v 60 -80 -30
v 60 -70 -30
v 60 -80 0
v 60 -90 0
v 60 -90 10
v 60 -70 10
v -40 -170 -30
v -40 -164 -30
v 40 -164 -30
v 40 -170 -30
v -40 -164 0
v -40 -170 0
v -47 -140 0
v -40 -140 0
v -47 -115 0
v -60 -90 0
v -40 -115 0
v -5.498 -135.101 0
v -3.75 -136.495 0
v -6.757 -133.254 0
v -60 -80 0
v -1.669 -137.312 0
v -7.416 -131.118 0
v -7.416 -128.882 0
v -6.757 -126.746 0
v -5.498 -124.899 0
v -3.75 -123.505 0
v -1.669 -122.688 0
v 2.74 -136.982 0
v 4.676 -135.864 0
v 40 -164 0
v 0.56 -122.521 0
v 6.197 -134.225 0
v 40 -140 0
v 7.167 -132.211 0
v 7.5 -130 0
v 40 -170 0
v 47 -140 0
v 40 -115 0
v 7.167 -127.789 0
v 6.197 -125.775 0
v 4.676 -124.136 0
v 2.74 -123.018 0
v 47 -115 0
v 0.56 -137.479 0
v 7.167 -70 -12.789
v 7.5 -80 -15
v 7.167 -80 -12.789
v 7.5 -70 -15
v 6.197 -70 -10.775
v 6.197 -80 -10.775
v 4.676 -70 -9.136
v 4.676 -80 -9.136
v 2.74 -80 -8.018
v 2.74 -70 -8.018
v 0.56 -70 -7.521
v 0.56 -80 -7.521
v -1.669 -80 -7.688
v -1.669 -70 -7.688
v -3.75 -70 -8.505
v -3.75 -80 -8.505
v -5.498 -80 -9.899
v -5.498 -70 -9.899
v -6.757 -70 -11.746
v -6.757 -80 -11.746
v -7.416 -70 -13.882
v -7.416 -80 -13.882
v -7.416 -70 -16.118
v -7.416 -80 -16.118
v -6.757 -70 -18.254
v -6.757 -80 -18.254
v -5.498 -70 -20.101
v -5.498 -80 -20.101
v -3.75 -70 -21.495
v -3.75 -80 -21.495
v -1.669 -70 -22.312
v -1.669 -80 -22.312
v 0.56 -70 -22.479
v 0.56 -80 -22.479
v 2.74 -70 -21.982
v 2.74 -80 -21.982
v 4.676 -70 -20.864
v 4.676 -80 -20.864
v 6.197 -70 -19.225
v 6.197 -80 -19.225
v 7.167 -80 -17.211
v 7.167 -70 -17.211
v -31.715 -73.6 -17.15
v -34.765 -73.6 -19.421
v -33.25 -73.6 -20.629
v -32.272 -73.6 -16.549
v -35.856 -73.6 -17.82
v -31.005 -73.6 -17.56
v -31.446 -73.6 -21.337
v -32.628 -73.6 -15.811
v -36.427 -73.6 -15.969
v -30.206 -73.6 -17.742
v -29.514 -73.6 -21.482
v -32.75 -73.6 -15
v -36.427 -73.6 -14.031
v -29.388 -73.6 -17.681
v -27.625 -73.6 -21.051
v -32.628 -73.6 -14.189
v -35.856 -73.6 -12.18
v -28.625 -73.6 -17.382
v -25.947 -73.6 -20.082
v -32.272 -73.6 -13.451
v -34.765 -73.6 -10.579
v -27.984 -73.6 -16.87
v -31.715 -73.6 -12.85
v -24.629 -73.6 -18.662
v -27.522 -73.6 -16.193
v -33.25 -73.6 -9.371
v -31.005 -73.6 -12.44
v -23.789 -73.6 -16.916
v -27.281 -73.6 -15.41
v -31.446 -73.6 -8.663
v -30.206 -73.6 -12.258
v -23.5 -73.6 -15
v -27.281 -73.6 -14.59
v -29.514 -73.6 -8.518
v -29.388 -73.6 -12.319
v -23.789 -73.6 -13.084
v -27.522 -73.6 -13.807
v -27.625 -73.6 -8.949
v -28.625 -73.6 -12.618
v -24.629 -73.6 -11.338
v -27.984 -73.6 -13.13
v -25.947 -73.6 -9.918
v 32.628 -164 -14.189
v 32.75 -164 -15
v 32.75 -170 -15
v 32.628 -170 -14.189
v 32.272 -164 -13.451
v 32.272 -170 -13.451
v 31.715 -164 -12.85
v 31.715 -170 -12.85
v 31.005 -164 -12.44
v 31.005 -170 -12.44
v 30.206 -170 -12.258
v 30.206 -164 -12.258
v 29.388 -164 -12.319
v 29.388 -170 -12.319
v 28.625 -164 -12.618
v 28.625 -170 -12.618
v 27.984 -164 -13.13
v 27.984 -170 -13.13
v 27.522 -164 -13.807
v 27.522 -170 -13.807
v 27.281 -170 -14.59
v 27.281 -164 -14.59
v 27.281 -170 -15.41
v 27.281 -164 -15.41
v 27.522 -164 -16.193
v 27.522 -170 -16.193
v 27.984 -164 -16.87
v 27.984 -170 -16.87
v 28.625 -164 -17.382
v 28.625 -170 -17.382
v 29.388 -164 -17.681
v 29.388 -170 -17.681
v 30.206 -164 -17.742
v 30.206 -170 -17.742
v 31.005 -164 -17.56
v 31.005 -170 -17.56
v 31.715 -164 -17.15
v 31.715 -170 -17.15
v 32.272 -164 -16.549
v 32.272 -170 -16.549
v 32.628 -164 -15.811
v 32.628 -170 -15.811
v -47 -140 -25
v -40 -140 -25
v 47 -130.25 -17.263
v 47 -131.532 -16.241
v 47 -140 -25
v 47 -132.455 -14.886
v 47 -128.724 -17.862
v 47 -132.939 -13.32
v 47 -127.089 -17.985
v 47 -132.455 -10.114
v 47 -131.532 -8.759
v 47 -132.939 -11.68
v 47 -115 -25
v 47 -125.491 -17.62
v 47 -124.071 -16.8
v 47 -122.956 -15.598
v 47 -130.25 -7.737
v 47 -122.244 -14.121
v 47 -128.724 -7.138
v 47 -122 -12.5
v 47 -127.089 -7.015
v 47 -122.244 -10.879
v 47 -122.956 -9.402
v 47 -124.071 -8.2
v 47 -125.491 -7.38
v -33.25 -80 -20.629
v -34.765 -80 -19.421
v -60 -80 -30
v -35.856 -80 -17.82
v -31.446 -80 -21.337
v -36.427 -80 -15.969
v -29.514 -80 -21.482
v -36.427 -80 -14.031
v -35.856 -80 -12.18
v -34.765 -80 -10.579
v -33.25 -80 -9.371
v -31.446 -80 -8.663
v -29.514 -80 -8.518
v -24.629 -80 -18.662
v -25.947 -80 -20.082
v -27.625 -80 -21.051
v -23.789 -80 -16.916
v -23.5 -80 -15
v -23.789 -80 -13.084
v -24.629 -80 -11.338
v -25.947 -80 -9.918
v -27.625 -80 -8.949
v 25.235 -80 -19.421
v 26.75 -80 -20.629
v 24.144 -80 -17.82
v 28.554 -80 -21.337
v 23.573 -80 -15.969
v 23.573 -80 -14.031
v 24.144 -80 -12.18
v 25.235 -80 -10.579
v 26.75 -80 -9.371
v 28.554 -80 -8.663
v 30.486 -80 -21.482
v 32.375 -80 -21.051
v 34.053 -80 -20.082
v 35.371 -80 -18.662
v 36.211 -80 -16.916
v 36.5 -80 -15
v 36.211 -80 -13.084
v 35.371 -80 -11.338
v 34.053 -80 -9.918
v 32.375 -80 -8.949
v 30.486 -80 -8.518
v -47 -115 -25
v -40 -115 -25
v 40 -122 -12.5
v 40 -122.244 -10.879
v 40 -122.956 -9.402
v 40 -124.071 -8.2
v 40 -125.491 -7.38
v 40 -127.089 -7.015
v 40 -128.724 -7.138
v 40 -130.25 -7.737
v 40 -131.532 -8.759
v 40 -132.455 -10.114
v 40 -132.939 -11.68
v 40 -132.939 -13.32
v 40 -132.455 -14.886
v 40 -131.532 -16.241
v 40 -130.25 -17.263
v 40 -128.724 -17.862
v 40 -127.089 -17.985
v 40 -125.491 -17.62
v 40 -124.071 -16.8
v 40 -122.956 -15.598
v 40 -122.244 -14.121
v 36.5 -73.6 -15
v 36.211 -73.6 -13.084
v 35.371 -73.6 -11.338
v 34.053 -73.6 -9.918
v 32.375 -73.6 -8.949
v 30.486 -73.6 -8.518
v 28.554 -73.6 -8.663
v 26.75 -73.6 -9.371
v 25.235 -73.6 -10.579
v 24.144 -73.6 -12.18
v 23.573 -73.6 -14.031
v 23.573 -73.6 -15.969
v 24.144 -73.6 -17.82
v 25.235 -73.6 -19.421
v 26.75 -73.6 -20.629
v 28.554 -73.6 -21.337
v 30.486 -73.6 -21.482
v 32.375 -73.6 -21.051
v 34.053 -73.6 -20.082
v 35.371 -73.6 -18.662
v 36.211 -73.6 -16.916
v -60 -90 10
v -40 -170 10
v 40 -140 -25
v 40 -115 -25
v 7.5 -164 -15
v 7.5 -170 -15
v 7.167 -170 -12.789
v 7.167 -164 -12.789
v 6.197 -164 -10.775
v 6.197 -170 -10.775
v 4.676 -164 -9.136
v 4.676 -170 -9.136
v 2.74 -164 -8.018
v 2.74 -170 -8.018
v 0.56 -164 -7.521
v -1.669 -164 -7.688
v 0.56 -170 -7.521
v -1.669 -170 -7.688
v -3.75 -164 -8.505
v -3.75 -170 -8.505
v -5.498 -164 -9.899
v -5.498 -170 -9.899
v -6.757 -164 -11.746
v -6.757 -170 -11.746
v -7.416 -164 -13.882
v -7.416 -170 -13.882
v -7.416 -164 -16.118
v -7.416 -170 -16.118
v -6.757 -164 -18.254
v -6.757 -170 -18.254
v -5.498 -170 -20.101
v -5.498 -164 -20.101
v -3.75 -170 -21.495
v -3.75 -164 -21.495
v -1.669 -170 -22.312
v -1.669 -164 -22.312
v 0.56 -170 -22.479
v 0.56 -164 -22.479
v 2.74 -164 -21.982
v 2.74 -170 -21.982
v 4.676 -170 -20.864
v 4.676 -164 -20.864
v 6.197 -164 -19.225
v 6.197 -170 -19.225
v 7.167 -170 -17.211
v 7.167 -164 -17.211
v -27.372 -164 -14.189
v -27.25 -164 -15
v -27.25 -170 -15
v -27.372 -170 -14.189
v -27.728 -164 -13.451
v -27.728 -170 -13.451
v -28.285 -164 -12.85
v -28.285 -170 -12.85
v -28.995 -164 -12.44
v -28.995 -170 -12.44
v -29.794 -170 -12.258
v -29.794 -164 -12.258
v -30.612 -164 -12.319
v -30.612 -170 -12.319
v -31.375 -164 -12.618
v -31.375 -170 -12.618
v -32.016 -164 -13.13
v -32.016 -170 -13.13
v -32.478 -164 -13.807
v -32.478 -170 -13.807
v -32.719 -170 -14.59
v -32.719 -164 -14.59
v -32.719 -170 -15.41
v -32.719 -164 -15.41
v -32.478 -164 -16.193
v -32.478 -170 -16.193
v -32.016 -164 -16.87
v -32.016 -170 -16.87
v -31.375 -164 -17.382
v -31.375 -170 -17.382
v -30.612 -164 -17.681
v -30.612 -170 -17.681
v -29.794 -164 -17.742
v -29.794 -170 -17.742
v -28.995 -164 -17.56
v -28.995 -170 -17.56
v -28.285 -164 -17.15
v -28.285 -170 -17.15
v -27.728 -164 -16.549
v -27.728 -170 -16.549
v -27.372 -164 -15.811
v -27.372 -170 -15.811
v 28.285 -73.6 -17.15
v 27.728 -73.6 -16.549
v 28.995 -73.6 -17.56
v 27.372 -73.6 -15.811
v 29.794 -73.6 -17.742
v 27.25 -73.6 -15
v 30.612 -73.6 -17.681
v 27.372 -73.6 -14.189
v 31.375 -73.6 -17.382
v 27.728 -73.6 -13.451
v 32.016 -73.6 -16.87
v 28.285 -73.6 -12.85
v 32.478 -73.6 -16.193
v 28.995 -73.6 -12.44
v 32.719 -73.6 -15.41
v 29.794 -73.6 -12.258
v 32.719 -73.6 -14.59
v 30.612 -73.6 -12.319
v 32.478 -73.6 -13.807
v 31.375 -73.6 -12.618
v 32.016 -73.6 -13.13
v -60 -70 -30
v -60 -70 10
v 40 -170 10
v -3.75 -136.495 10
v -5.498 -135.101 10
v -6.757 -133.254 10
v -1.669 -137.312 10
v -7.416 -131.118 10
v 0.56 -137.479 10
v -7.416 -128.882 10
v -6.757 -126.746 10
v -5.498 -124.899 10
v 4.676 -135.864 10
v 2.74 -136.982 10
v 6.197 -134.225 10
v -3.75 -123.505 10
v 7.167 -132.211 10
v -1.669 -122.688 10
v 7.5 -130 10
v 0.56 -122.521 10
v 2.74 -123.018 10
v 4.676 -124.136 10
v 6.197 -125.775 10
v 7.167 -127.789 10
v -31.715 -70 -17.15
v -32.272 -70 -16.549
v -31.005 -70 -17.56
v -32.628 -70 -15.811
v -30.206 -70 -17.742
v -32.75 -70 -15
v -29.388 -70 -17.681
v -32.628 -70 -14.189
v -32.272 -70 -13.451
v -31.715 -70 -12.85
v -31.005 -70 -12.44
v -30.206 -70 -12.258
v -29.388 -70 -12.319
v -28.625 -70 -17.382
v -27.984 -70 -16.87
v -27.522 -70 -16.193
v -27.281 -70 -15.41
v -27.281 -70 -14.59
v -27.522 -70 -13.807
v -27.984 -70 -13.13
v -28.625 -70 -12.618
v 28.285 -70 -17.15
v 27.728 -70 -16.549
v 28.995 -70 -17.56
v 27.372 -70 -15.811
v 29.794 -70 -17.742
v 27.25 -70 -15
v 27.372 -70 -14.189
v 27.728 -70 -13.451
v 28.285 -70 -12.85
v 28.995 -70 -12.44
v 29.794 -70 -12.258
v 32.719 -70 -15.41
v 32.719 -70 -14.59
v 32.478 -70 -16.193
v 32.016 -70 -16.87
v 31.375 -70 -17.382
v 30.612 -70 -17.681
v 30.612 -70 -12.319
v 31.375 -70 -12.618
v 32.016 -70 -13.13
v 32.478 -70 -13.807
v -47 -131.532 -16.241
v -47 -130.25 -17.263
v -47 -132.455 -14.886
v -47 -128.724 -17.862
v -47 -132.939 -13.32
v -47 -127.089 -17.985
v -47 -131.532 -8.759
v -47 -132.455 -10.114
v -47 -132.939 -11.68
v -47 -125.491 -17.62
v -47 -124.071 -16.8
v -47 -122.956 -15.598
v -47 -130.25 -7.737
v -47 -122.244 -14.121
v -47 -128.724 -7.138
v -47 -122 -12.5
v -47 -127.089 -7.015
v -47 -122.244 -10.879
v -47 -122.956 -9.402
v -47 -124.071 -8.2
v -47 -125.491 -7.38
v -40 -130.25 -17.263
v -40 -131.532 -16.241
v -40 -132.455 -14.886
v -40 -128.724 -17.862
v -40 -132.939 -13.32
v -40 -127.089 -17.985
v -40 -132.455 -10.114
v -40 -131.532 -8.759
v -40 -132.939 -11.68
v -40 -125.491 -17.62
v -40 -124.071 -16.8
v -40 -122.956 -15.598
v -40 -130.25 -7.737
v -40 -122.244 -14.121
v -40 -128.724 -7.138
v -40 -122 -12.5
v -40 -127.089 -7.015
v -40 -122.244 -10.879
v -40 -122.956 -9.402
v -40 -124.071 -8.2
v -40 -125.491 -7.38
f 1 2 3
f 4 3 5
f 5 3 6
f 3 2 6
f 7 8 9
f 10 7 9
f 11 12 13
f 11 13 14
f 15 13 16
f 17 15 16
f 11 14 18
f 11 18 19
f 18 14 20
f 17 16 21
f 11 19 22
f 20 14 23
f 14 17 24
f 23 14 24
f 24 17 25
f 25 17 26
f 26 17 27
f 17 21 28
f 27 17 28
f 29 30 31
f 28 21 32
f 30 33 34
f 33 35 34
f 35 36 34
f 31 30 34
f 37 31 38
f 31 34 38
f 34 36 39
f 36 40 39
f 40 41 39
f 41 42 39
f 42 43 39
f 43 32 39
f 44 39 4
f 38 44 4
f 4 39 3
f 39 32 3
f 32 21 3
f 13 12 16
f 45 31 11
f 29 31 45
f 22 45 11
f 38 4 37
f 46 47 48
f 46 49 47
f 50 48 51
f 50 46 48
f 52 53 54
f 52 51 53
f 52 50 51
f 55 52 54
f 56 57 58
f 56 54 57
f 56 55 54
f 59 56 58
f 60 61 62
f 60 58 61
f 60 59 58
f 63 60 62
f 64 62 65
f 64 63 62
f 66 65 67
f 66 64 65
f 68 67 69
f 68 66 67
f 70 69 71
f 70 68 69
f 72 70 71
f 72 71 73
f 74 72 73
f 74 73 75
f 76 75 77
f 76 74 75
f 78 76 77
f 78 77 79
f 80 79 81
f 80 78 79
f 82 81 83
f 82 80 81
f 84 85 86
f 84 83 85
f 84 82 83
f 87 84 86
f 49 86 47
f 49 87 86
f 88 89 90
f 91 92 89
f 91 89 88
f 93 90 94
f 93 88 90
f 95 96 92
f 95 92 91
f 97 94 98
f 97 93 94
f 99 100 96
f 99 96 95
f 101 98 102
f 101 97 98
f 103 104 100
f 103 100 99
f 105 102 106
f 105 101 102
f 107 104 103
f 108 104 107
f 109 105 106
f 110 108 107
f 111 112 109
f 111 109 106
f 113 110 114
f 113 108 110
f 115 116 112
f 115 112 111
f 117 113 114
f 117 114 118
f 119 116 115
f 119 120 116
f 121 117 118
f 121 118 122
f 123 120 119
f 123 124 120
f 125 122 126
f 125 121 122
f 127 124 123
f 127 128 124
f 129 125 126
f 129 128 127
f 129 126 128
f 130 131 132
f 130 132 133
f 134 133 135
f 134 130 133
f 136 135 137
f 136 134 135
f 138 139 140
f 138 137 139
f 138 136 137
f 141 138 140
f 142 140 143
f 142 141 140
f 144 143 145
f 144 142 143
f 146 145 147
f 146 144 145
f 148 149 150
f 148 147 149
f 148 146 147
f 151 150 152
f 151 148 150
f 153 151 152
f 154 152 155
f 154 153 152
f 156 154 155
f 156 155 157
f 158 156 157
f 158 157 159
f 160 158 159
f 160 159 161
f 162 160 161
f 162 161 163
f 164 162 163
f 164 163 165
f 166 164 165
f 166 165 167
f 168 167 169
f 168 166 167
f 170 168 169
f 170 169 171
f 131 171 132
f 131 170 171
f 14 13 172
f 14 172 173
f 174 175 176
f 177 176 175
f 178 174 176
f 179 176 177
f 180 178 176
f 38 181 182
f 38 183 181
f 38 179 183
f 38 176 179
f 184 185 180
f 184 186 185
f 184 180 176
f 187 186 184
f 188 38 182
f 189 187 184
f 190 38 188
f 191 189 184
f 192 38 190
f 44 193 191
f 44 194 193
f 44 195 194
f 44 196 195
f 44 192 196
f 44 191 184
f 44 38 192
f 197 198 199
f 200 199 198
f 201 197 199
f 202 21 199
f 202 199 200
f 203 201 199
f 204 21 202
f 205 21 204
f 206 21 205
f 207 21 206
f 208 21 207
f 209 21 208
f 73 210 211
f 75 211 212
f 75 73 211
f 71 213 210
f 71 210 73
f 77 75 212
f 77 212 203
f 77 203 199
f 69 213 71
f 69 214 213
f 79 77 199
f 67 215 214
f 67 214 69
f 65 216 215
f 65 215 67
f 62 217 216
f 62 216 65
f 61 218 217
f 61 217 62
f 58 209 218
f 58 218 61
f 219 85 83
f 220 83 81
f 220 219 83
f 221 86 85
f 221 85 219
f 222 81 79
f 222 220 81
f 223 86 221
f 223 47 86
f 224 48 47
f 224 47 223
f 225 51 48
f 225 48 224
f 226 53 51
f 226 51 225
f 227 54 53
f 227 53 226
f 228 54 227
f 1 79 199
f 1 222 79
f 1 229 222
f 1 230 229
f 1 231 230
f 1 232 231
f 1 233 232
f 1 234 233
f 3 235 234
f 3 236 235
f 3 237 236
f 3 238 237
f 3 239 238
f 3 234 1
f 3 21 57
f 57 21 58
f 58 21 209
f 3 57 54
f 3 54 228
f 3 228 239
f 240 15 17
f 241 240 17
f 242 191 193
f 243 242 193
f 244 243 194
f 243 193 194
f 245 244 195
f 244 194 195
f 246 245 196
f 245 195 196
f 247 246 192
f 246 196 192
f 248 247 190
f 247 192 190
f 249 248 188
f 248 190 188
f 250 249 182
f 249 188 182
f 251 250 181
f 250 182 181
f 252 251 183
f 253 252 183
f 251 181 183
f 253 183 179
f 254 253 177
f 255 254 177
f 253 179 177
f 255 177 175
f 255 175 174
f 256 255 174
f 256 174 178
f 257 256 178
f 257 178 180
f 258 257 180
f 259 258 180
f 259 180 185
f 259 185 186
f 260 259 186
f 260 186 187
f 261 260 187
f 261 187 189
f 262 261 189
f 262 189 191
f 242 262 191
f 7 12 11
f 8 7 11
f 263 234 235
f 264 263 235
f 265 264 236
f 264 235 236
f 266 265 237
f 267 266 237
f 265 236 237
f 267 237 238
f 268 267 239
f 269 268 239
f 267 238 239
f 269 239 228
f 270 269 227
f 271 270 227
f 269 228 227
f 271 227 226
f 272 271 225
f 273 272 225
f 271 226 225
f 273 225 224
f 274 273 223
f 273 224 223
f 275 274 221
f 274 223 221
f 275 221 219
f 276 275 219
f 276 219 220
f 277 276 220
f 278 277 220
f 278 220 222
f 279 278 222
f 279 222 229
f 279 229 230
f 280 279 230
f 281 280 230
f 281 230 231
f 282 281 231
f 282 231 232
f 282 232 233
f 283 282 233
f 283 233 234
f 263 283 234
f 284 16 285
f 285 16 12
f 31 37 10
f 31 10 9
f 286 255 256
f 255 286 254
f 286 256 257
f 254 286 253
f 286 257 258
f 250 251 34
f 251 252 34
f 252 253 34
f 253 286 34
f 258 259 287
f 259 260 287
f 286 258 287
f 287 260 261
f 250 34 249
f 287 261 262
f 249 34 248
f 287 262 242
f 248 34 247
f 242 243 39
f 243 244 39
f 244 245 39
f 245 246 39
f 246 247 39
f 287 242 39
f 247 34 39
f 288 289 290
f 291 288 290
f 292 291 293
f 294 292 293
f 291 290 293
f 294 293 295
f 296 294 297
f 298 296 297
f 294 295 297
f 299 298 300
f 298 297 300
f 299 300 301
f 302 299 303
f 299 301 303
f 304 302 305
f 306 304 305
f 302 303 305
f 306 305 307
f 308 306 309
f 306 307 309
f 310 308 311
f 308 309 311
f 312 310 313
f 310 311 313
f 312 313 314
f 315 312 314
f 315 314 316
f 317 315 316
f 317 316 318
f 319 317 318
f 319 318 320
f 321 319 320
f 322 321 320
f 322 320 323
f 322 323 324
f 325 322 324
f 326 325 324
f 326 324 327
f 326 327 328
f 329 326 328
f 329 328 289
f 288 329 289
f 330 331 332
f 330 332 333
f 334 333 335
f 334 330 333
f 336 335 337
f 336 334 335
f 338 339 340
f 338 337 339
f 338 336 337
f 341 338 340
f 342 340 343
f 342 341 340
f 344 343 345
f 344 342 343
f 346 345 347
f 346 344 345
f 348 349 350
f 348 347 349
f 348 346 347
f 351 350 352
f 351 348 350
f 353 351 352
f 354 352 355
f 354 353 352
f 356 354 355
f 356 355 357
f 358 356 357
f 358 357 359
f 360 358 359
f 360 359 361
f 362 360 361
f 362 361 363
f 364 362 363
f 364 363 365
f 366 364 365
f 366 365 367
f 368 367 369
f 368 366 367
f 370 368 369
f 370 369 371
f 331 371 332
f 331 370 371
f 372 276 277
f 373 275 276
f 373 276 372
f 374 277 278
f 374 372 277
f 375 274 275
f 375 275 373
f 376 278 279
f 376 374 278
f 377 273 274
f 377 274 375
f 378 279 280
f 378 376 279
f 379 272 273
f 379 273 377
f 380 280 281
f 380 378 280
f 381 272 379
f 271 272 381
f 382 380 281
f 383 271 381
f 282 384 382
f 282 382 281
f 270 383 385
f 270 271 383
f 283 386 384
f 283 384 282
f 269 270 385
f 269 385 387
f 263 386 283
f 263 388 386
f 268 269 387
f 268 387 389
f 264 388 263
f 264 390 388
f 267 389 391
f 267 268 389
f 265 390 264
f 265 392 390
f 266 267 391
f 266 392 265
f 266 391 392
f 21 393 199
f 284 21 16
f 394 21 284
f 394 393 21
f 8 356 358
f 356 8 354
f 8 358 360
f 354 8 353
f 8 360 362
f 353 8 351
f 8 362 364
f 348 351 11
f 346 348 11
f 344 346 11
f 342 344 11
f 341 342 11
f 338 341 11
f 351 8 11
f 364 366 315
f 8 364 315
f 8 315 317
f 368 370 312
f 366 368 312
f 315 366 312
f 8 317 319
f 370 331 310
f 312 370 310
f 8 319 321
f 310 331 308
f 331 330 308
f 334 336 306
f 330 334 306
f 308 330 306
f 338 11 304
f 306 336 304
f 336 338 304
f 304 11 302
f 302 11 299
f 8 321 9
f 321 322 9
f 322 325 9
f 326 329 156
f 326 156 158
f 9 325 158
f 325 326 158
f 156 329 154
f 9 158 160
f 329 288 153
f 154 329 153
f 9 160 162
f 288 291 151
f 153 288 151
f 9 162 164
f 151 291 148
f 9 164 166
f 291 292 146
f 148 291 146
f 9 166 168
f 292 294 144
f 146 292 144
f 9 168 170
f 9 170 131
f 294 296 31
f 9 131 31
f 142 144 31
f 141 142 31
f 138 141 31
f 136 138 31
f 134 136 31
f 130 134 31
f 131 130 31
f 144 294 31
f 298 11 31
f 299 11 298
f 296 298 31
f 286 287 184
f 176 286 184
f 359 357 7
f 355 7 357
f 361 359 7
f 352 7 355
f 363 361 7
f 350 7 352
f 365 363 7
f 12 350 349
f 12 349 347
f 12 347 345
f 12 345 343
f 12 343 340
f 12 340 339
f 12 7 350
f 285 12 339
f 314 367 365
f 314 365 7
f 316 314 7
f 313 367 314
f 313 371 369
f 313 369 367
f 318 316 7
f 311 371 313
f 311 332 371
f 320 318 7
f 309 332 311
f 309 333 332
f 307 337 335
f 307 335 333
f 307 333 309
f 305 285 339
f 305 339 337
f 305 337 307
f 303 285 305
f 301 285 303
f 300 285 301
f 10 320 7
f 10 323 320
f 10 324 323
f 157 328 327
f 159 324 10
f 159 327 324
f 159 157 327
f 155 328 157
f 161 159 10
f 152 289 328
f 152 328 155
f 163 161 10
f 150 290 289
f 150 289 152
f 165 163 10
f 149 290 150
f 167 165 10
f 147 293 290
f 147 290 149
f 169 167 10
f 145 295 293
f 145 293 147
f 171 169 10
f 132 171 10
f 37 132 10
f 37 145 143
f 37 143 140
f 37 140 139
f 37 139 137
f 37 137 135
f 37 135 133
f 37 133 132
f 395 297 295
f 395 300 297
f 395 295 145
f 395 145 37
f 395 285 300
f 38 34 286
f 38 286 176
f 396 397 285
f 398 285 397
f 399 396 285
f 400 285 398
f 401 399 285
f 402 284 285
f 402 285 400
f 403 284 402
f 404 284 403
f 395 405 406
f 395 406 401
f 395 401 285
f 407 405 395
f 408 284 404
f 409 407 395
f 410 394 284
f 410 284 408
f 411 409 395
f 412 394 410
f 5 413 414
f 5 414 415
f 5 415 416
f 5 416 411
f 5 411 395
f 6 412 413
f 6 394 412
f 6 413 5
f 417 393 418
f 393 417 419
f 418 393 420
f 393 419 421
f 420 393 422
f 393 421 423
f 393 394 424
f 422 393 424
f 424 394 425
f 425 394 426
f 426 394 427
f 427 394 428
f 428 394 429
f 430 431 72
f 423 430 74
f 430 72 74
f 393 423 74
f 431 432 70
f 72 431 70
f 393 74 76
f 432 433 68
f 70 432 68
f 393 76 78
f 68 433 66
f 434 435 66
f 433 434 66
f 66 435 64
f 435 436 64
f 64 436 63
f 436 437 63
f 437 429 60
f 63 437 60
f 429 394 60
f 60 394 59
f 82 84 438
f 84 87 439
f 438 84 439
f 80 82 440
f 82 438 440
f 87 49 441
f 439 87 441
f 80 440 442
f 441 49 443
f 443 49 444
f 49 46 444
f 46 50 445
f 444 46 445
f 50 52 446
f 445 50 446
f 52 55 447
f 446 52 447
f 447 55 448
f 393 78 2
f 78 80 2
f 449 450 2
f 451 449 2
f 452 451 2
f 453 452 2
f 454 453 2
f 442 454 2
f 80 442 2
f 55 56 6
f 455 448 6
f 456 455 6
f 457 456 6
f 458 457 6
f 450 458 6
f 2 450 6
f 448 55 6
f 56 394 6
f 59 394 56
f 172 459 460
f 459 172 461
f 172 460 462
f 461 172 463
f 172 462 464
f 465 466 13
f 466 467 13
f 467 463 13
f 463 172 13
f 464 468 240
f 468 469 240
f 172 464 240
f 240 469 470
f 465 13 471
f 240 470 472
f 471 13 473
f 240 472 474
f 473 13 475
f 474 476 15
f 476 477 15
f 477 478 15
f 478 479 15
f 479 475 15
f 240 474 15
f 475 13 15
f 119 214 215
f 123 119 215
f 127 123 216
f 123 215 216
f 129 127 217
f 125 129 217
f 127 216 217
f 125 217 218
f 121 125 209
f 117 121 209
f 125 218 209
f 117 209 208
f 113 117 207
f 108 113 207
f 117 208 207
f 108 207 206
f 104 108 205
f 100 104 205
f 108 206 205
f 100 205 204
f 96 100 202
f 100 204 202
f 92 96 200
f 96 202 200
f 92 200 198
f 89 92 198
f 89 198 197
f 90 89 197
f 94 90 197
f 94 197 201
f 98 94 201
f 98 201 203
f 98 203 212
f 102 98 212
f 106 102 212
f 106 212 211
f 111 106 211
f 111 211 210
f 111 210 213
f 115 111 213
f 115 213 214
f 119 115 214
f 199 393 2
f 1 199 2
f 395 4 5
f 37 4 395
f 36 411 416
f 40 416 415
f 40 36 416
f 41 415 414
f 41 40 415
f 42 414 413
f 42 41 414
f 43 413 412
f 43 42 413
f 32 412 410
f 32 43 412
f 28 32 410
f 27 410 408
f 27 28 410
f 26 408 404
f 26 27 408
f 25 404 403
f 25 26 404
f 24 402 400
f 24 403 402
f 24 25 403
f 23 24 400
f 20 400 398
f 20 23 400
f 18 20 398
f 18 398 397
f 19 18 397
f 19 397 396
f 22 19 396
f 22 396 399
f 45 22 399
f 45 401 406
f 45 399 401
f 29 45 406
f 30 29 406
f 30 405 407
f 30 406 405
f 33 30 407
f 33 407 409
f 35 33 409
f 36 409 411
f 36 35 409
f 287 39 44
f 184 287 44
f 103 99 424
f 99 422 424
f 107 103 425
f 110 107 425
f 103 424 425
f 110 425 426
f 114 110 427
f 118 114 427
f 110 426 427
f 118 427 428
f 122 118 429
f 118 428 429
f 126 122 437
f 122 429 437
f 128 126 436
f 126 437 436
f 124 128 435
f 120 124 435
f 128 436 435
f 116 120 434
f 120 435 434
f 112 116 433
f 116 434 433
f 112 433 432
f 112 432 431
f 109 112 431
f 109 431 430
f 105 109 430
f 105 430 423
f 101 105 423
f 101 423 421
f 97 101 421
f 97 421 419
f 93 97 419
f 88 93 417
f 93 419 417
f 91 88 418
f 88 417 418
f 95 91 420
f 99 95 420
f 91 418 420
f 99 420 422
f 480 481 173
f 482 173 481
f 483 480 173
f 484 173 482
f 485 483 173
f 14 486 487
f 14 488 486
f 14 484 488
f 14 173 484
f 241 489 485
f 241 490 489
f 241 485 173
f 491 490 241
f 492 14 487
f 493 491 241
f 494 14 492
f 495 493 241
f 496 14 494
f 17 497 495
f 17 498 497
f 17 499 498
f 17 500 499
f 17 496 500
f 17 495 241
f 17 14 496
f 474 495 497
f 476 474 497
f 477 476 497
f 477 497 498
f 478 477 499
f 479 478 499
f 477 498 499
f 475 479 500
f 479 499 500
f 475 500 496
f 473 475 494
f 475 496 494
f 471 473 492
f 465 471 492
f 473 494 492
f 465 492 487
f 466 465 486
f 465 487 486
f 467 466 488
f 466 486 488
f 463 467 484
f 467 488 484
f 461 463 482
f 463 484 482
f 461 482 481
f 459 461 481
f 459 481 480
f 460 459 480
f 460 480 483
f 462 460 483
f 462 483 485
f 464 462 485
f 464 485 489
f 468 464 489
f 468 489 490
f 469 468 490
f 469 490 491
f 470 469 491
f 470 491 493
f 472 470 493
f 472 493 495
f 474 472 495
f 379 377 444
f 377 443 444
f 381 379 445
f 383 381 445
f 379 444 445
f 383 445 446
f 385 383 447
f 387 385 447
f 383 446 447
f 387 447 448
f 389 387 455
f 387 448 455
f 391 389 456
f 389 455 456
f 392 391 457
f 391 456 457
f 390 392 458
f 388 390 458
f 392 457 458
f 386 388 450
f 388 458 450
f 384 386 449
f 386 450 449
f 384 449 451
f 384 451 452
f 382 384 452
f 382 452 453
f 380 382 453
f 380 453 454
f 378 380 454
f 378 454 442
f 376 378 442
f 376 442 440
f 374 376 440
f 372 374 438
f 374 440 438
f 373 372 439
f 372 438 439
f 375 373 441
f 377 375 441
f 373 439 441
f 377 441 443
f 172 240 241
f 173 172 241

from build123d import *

# Parameters (mm, degrees)
SKETCH_W            = 120
SKETCH_H            = 100
PAD_DEPTH           = 10
SKETCH001_W         = 120
SKETCH001_H         = 30
PAD001_DEPTH        = 10
POCKET_DEPTH        = 36
SKETCH003_W         = 80
SKETCH003_H         = 6
PAD002_DEPTH        = 30
SKETCH004_R         = 2.75
HOLE_DEPTH          = 10.001
SKETCH005_W         = 7
SKETCH005_H         = 25
PAD003_DEPTH        = 25
SKETCH006_R         = 5.5
HOLE001_DEPTH       = 130.001
SKETCH011_R         = 7.5
HOLE004_DEPTH       = 25
HOLE004_TIPS_R      = 7.5
HOLE005_D           = 5.5
HOLE005_DEPTH       = 25
HOLE005_CBORE_D     = 13
HOLE005_CBORE_DEPTH = 6.4
SKETCH013_R         = 7.5
HOLE006_DEPTH       = 170.001
SKETCH014_R         = 7.5
HOLE007_DEPTH       = 25


with BuildPart() as part:
    # Sketch → Pad (new body)
    with BuildSketch(Plane.XY):
        with Locations((0, -120)):
            Rectangle(SKETCH_W, SKETCH_H)
    extrude(amount=PAD_DEPTH)

    # Sketch001 → Pad001 (join)
    with BuildSketch(Plane.XZ.offset(70)):
        with Locations((0, -15)):
            Rectangle(SKETCH001_W, SKETCH001_H)
    extrude(amount=PAD001_DEPTH)

    # Sketch002 → Pocket (cut)
    with BuildSketch(Plane.XY):
        Polygon((-60, -170), (-60, -90), (-40, -170), align=None)
        Polygon((60, -170), (60, -90), (40, -170), align=None)
    extrude(amount=POCKET_DEPTH, mode=Mode.SUBTRACT)

    # Sketch003 → Pad002 (join)
    with BuildSketch(Plane.XY):
        with Locations((0, -167)):
            Rectangle(SKETCH003_W, SKETCH003_H)
    extrude(amount=-PAD002_DEPTH)

    # Sketch004 → Hole (cut, through all)
    with BuildSketch(Plane.XZ.offset(160)):
        with Locations((-30, -15)):
            Circle(SKETCH004_R)
        with Locations((30, -15)):
            Circle(SKETCH004_R)
    extrude(amount=HOLE_DEPTH, mode=Mode.SUBTRACT)

    # Sketch005 → Pad003 (join)
    with BuildSketch(Plane.XY):
        with Locations((43.5, -127.5)):
            Rectangle(SKETCH005_W, SKETCH005_H)
        with Locations((-43.5, -127.5)):
            Rectangle(SKETCH005_W, SKETCH005_H)
    extrude(amount=-PAD003_DEPTH)

    # Sketch006 → Hole001 (cut, through all)
    with BuildSketch(Plane.YZ.offset(70)):
        with Locations((-127.5, -12.5)):
            Circle(SKETCH006_R)
    extrude(amount=-HOLE001_DEPTH, mode=Mode.SUBTRACT)

    # Sketch011 → Hole004 (cut)
    with BuildSketch(Plane.XZ.offset(170)):
        with Locations((0, -15)):
            Circle(SKETCH011_R)
    extrude(amount=-HOLE004_DEPTH, mode=Mode.SUBTRACT)

    # Hole004 tips → Hole004 tip 1 section 0
    with BuildSketch(Plane.XZ.offset(145), mode=Mode.PRIVATE) as hole004_tip_1_s0:
        with Locations((0, -15)):
            Circle(HOLE004_TIPS_R)
    loft([hole004_tip_1_s0.sketch, Vertex(0, -140.493545, -15)], mode=Mode.SUBTRACT)

    # Hole005
    with Locations(Plane.XZ.offset(80)):
        with Locations((-30, -15), (30, -15)):
            CounterBoreHole(HOLE005_D / 2, HOLE005_CBORE_D / 2, HOLE005_CBORE_DEPTH, depth=HOLE005_DEPTH)

    # Sketch013 → Hole006 (cut, through all)
    with BuildSketch(Plane.XZ):
        with Locations((0, -15)):
            Circle(SKETCH013_R)
    extrude(amount=HOLE006_DEPTH, mode=Mode.SUBTRACT)

    # Sketch014 → Hole007 (cut)
    with BuildSketch(Plane.XY):
        with Locations((0, -130)):
            Circle(SKETCH014_R)
    extrude(amount=HOLE007_DEPTH, mode=Mode.SUBTRACT)


solid = part.part
